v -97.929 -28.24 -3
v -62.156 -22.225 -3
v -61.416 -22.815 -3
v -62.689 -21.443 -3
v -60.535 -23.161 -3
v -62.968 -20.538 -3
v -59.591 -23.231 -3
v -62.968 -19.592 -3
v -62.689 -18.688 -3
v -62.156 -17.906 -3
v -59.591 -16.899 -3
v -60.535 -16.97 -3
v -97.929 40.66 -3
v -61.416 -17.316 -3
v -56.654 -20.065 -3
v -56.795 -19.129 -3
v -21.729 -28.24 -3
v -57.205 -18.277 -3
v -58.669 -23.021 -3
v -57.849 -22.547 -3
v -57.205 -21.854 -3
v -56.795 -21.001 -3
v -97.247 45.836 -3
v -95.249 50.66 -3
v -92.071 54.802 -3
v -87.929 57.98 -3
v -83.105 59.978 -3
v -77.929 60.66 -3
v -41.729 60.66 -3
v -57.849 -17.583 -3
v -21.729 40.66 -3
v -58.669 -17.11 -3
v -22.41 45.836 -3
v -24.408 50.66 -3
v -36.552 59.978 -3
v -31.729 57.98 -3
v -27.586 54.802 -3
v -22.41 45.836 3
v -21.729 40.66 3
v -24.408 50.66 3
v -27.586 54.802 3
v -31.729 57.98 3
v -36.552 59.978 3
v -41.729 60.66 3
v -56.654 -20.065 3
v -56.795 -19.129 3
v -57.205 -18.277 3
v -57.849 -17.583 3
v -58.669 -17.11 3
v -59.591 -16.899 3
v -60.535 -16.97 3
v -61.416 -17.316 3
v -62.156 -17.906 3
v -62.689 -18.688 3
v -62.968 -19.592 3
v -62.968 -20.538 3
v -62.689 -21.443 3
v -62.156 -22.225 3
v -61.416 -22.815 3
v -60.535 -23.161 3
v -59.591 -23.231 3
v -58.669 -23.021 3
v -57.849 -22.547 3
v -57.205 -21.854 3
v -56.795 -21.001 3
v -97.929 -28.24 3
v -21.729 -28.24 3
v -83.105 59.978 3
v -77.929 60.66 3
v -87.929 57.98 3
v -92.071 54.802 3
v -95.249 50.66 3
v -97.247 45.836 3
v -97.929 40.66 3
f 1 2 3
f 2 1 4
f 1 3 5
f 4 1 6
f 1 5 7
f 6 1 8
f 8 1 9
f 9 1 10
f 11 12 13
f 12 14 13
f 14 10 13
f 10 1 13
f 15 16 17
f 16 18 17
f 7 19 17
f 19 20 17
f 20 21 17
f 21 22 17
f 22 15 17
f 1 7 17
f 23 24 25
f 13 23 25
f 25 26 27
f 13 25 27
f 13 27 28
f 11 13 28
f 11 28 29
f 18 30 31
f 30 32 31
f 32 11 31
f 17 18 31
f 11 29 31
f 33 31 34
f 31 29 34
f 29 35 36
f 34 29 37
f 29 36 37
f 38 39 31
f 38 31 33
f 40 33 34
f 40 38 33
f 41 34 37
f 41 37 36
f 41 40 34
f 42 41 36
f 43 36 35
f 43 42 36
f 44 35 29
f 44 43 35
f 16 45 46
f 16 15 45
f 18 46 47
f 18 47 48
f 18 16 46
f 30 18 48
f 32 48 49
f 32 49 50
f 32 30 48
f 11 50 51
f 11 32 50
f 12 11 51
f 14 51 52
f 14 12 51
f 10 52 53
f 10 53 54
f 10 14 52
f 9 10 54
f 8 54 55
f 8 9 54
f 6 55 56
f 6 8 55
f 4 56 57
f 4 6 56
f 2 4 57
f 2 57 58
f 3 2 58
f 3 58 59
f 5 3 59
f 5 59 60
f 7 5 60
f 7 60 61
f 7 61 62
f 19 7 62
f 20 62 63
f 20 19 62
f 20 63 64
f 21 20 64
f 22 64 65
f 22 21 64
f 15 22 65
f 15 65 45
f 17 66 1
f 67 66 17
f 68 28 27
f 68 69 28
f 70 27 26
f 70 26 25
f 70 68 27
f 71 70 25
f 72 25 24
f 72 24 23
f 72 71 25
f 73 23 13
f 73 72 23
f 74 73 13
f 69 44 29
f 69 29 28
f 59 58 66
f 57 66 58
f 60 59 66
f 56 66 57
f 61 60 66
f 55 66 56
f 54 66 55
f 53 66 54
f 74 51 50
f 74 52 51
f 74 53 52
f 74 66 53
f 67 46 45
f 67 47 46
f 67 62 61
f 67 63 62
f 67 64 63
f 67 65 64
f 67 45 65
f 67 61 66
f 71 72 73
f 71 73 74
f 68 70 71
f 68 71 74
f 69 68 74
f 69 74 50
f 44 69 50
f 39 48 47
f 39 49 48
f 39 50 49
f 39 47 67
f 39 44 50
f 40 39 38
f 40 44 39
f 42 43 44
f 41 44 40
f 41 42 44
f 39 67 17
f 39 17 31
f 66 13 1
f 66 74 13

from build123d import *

# Parameters (mm, degrees)
F0_R     = 3.175
F1_DEPTH = 3


with BuildPart() as f1:
    # F0 (on Top) → F1 (new body, symmetric)
    with BuildSketch(Plane.XY):
        with BuildLine():
            Line((-97.928558, -28.24017), (-21.728558, -28.24017))
            Line((-21.728558, -28.24017), (-21.728558, 40.65983))
            ThreePointArc((-21.728558, 40.65983), (-27.586423, 54.801966), (-41.728558, 60.65983))
            Line((-41.728558, 60.65983), (-77.928558, 60.65983))
            ThreePointArc((-77.928558, 60.65983), (-92.070694, 54.801966), (-97.928558, 40.65983))
            Line((-97.928558, 40.65983), (-97.928558, -28.24017))
        make_face()
        with Locations((-59.828558, -20.06517)):
            Circle(F0_R, mode=Mode.SUBTRACT)
    extrude(amount=F1_DEPTH, both=True)


solid = f1.part
